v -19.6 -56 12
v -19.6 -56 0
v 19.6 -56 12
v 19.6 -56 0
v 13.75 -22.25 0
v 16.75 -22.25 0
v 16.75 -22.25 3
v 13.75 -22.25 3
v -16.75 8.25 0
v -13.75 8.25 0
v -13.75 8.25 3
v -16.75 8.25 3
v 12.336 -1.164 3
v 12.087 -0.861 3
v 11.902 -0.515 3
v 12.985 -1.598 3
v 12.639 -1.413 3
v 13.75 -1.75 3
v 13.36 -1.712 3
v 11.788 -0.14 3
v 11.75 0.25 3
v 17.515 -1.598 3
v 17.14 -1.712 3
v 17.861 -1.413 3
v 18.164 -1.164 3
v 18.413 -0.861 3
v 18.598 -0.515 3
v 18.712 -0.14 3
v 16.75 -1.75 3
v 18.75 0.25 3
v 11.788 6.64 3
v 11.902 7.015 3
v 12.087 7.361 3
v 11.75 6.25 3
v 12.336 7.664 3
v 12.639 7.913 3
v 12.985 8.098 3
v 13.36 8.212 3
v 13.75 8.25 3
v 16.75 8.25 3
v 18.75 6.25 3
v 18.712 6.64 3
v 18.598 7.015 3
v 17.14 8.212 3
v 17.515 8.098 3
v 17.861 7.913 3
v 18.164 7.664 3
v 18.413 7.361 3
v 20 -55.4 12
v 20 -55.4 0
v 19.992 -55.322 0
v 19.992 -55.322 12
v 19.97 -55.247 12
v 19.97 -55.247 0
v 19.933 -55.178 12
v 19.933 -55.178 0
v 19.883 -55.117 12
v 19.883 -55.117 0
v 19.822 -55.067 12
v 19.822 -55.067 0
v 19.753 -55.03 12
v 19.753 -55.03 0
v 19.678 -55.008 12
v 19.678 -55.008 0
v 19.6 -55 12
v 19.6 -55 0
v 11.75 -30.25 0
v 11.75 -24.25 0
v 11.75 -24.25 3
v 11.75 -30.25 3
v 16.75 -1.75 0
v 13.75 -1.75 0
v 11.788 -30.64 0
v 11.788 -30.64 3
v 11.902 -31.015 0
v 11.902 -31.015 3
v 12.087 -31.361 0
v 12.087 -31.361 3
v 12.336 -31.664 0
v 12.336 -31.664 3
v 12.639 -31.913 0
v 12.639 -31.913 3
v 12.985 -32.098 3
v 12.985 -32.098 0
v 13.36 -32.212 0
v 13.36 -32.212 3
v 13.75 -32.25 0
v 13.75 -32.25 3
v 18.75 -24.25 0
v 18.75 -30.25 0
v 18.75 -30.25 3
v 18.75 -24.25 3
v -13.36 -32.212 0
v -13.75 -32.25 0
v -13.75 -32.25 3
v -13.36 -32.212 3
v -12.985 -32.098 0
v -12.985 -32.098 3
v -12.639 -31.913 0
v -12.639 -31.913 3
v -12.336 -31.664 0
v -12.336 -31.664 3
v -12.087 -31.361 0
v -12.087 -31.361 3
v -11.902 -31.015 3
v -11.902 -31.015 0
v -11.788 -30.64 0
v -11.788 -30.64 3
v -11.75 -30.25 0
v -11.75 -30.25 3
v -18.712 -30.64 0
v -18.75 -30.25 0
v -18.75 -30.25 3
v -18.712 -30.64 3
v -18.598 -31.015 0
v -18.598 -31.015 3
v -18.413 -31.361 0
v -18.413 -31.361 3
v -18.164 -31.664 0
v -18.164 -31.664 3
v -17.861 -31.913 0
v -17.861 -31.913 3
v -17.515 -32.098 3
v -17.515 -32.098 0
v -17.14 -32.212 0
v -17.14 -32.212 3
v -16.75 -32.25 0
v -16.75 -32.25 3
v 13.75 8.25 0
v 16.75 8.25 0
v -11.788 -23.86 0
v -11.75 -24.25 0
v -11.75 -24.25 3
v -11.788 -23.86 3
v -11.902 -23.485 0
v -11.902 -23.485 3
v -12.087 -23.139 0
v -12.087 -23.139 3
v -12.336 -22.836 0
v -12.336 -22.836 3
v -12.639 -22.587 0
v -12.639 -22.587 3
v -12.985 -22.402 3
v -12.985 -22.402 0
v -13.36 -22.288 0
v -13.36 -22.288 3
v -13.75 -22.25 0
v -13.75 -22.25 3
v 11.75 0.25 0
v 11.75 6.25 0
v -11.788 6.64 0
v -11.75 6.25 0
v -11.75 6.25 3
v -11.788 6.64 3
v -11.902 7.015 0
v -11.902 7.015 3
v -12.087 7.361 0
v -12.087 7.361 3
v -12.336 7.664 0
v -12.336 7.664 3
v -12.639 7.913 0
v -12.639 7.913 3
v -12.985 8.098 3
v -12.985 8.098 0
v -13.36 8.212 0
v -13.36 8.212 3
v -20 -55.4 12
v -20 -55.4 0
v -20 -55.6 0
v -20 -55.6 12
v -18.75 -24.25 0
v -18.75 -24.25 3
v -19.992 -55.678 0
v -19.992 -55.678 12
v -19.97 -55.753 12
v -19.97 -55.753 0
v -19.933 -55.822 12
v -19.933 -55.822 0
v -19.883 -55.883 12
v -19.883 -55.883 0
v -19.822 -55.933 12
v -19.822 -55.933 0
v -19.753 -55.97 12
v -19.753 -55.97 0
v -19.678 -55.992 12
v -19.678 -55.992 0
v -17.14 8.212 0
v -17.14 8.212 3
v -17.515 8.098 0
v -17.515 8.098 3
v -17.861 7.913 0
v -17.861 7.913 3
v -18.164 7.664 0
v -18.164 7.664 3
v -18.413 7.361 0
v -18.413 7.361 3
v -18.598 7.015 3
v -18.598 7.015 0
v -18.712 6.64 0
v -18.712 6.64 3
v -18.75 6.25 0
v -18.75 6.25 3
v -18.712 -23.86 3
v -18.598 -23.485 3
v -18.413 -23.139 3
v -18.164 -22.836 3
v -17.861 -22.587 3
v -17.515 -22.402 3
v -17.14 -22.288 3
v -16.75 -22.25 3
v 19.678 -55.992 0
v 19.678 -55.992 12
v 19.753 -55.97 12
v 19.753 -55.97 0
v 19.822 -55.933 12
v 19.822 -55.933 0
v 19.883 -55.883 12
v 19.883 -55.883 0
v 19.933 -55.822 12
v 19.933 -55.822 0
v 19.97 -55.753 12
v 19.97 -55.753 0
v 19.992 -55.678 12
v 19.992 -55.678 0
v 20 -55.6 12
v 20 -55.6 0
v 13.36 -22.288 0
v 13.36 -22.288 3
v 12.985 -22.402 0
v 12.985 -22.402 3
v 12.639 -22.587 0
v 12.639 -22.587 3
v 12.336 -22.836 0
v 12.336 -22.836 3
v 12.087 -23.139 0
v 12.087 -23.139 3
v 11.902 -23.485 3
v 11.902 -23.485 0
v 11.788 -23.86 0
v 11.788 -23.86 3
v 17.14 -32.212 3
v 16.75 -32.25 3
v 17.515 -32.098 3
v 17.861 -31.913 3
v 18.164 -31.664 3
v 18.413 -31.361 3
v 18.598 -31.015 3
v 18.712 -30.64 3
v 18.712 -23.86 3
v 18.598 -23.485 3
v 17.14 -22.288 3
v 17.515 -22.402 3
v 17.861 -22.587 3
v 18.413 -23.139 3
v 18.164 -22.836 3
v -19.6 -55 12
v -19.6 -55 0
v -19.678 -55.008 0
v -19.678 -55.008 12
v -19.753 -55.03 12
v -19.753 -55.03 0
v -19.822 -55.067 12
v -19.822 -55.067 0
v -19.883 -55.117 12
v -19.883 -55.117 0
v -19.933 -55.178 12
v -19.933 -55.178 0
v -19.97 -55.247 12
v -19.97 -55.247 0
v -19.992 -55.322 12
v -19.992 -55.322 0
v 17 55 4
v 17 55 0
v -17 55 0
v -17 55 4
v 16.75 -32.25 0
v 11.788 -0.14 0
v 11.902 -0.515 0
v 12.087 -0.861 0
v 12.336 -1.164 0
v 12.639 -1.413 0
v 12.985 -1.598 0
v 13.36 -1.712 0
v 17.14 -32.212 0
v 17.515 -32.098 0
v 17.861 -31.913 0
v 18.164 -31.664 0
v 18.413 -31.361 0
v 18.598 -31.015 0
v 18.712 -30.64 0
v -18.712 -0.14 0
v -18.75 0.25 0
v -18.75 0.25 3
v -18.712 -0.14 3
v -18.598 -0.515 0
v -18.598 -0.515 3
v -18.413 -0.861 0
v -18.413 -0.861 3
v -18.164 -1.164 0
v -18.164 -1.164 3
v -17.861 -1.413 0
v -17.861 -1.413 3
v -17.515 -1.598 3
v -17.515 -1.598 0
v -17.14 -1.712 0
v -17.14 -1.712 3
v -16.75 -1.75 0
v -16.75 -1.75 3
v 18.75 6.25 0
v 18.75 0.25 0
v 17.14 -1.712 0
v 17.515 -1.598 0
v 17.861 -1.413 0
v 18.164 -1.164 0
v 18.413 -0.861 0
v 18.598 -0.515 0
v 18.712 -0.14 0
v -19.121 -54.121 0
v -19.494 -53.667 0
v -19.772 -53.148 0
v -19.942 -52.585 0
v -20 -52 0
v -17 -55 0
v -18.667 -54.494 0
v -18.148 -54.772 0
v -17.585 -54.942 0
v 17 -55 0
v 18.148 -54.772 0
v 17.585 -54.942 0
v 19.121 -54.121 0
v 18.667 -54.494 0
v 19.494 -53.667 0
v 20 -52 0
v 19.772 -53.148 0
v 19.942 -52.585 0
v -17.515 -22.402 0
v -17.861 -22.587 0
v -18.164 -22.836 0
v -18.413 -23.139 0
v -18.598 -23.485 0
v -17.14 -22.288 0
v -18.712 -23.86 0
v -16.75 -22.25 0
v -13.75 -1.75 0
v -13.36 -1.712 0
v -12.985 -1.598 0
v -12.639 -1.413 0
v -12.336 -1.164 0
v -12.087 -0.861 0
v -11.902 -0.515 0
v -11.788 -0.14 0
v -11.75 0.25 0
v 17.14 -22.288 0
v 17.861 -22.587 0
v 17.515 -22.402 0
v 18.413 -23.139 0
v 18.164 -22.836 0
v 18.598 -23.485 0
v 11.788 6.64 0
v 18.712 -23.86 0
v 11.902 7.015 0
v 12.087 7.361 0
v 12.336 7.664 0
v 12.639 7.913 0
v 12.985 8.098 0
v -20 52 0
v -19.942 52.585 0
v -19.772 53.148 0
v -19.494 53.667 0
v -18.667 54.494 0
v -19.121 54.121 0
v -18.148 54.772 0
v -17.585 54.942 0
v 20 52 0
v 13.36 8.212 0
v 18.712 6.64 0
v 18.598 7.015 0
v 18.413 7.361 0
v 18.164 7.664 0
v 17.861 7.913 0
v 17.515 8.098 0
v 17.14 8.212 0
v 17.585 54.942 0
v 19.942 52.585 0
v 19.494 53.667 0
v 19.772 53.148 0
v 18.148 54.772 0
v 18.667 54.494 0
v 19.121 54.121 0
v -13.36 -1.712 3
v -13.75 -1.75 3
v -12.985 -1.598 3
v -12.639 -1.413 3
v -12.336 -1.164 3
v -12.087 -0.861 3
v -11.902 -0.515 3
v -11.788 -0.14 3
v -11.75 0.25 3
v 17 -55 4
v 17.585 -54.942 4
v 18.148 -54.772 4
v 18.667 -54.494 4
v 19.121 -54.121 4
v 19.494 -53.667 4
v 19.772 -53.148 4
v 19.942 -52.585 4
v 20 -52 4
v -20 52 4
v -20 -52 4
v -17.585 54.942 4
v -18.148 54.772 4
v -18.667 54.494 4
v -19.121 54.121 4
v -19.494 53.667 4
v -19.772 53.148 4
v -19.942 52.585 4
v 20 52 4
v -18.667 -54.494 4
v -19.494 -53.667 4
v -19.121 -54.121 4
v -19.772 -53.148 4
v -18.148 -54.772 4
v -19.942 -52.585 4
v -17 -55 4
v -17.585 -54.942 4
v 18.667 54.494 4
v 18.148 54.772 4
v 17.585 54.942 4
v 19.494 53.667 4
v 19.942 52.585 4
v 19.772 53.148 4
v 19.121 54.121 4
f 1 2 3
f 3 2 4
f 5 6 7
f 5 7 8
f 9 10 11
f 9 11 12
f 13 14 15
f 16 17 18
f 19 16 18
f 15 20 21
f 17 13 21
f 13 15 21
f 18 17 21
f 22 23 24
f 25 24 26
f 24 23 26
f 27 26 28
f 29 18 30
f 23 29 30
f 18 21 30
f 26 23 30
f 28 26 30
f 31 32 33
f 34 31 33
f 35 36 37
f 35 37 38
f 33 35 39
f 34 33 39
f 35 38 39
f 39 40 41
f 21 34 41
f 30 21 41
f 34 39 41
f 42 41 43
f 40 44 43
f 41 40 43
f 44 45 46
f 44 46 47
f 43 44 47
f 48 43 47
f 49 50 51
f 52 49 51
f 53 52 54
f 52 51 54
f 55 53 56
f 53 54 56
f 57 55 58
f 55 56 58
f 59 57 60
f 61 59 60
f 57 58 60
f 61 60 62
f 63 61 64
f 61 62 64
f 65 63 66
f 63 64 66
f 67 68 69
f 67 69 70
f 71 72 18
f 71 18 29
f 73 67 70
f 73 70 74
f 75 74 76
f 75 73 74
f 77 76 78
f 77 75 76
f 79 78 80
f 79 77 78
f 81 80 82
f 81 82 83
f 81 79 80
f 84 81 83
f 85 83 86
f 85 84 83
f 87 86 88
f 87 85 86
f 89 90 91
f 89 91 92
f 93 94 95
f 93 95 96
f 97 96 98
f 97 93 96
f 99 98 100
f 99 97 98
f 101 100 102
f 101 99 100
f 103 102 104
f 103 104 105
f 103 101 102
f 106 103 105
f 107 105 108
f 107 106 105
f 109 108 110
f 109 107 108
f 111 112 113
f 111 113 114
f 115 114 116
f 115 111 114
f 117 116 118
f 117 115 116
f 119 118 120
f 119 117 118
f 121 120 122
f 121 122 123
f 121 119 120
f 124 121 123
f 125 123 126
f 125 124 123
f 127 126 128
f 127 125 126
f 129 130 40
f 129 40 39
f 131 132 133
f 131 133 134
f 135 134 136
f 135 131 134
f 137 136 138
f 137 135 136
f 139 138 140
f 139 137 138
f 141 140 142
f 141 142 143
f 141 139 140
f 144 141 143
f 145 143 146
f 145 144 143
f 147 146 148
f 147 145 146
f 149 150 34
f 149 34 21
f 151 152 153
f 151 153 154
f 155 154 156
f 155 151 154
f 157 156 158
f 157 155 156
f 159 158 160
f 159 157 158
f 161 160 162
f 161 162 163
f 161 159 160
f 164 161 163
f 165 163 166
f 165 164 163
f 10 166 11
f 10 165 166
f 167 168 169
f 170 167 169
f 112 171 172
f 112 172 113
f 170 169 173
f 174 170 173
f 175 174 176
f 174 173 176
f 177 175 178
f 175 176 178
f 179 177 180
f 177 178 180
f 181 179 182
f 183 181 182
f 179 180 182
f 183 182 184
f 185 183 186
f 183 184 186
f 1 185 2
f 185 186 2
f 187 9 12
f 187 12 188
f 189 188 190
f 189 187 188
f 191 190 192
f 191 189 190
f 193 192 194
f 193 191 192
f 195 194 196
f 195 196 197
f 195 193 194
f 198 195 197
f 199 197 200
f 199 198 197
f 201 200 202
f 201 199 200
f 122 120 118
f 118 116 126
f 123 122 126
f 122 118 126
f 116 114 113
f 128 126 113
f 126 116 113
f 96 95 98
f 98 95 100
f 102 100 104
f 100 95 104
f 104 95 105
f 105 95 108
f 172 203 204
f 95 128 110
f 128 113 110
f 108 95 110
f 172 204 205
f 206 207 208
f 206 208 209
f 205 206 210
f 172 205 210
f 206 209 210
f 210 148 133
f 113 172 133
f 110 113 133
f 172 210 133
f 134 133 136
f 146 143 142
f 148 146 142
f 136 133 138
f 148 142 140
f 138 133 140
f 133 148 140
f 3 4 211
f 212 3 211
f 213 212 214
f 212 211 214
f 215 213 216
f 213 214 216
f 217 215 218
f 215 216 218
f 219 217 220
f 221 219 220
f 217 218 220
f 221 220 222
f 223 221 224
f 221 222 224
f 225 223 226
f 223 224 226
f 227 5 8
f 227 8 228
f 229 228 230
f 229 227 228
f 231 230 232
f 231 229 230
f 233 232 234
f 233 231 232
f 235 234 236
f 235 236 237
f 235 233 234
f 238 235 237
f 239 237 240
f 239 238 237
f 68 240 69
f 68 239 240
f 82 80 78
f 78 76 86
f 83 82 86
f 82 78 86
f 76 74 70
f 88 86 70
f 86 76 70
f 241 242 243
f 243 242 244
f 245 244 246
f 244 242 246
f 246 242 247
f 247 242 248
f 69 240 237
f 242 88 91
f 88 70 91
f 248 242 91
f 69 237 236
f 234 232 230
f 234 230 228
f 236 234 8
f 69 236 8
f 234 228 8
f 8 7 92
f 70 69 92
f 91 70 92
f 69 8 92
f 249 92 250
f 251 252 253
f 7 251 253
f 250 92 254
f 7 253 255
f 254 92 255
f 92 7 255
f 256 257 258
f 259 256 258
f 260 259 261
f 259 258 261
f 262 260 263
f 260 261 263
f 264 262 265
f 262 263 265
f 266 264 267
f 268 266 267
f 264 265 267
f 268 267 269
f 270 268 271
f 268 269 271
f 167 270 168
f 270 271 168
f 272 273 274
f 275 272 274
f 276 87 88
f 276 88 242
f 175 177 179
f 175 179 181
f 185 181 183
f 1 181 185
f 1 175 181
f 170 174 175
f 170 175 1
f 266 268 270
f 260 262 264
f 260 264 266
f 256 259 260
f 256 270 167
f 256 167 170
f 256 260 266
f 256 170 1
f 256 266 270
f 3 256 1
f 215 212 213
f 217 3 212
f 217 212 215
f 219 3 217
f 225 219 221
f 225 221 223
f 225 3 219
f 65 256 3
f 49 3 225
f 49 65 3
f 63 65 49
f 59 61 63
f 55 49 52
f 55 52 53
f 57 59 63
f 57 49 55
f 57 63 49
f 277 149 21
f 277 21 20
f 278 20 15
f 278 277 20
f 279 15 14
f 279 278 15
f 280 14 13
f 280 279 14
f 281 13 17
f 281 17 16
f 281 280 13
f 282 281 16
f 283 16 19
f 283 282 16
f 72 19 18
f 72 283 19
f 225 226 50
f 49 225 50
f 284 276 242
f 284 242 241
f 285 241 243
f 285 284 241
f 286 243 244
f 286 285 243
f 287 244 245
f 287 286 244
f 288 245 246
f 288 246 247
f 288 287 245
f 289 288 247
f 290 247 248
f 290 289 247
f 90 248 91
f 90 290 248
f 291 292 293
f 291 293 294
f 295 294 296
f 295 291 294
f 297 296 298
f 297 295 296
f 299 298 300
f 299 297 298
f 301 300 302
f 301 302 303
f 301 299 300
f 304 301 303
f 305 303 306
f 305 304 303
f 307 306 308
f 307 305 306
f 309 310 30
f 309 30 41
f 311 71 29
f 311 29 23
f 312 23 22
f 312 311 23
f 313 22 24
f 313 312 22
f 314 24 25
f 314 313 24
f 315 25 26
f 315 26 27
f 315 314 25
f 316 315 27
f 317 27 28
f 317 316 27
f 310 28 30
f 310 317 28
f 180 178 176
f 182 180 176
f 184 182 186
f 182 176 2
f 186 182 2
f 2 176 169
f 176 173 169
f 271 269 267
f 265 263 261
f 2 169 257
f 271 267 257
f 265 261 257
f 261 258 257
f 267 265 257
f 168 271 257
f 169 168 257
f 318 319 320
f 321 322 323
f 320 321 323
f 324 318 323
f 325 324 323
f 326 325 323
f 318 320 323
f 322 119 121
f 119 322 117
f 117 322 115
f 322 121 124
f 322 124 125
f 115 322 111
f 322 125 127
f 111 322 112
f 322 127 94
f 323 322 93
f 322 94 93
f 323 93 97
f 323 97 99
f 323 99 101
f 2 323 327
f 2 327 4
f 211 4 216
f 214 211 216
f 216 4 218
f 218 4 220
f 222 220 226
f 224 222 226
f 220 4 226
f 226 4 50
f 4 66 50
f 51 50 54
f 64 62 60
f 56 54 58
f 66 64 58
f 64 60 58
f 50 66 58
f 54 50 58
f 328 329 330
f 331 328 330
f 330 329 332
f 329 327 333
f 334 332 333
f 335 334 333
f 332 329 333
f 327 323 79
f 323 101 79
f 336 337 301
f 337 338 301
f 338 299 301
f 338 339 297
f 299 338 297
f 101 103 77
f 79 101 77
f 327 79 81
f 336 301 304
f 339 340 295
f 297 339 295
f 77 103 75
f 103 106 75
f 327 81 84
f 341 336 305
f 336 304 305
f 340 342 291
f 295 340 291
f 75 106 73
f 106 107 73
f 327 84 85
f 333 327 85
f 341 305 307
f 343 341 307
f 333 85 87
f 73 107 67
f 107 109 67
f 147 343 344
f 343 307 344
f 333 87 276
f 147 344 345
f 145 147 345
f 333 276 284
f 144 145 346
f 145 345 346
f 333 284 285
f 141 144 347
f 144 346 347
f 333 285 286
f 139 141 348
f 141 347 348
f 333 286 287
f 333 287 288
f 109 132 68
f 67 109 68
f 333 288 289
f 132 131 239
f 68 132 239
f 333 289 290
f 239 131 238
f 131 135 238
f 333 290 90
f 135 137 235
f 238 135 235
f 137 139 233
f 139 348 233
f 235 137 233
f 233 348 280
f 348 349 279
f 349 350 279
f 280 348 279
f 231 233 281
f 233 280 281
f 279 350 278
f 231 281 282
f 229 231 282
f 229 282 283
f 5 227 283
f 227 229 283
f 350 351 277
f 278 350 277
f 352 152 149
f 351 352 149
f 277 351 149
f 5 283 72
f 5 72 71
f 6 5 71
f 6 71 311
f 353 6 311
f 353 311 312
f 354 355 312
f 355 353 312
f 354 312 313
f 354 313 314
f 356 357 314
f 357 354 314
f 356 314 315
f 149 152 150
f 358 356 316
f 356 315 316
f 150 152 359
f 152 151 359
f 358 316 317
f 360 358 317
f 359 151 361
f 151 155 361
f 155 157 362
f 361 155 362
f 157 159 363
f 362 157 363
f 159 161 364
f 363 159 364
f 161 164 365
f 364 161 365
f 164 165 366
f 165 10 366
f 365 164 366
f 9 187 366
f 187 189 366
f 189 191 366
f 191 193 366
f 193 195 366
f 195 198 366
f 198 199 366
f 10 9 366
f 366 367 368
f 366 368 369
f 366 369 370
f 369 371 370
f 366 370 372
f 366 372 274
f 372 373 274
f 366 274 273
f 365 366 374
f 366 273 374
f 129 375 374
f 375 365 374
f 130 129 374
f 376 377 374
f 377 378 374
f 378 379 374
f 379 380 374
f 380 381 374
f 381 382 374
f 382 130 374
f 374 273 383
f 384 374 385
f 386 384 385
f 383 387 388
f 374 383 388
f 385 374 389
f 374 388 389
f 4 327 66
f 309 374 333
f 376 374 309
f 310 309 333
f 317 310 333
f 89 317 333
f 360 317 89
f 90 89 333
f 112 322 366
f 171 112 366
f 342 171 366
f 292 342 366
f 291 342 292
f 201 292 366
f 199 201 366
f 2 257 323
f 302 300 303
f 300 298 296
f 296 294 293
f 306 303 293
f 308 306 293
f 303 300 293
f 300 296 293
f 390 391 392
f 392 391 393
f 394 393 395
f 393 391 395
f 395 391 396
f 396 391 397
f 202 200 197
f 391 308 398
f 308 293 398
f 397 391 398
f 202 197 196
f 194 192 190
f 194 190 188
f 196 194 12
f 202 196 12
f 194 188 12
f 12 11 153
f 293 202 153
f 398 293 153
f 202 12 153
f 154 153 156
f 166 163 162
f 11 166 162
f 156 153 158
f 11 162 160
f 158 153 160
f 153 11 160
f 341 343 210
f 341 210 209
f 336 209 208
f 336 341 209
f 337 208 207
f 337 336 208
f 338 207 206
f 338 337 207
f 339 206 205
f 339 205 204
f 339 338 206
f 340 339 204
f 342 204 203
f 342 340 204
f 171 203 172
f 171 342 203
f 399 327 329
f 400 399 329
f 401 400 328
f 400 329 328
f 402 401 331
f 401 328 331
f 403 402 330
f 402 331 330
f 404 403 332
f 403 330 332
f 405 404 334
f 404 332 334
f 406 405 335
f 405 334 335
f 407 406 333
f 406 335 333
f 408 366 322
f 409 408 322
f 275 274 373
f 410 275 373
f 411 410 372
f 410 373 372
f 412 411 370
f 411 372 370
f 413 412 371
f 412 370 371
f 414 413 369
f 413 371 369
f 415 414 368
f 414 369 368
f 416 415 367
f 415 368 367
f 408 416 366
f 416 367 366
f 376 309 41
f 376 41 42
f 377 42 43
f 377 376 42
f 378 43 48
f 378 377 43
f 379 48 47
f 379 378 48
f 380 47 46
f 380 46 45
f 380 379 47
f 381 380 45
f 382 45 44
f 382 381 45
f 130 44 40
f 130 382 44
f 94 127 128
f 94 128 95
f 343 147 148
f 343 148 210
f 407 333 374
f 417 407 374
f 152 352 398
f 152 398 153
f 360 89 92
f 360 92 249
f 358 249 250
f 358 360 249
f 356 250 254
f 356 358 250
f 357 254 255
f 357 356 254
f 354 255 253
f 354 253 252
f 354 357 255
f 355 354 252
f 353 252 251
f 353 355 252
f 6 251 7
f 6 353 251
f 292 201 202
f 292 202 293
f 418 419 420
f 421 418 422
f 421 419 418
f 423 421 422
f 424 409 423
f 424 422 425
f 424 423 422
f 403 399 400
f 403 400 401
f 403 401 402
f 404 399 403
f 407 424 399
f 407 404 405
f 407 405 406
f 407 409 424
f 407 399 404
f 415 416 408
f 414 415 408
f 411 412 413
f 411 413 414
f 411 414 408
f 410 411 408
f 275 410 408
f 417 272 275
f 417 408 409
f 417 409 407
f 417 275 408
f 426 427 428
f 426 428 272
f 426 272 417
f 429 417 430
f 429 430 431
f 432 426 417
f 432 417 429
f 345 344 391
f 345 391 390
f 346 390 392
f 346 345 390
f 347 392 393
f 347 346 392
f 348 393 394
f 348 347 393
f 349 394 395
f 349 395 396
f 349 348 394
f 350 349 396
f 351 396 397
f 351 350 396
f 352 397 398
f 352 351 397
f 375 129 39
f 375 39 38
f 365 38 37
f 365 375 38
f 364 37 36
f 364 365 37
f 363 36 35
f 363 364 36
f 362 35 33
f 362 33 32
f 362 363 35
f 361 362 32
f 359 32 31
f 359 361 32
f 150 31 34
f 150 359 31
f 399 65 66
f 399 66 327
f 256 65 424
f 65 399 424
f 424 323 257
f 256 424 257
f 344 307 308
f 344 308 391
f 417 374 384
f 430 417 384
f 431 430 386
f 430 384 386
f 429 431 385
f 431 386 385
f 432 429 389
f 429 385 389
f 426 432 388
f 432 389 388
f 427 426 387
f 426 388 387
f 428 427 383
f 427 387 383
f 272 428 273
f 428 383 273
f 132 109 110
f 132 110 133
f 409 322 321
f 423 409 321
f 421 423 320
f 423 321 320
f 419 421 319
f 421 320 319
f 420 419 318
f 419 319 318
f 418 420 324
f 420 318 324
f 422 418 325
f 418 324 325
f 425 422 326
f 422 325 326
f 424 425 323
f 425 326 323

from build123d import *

# Parameters (mm, degrees)
EXTRUDE_233_DEPTH     = 4
CUT_EXTRUDE_382_DEPTH = 3
EXTRUDE_469_DEPTH     = 12


with BuildPart() as part:
    # 草图3 → Extrude 233 (new body)
    with BuildSketch(Plane.XY):
        with BuildLine():
            Line((-17, -55), (17, -55))
            ThreePointArc((17, -55), (19.121320344, -54.121320344), (20, -52))
            Line((20, -52), (20, 52))
            ThreePointArc((20, 52), (19.121320344, 54.121320344), (17, 55))
            Line((17, 55), (-17, 55))
            ThreePointArc((-17, 55), (-19.121320344, 54.121320344), (-20, 52))
            Line((-20, 52), (-20, -52))
            ThreePointArc((-20, -52), (-19.121320344, -54.121320344), (-17, -55))
        make_face()
    extrude(amount=EXTRUDE_233_DEPTH)

    # 草图4 → Cut-Extrude 382 (cut)
    with BuildSketch(Plane.XY):
        with BuildLine():
            Line((-16.75, -32.25), (-13.75, -32.25))
            ThreePointArc((-13.75, -32.25), (-12.335786438, -31.664213562), (-11.75, -30.25))
            Line((-11.75, -30.25), (-11.75, -24.25))
            ThreePointArc((-11.75, -24.25), (-12.335786438, -22.835786438), (-13.75, -22.25))
            Line((-13.75, -22.25), (-16.75, -22.25))
            ThreePointArc((-16.75, -22.25), (-18.164213562, -22.835786438), (-18.75, -24.25))
            Line((-18.75, -24.25), (-18.75, -30.25))
            ThreePointArc((-18.75, -30.25), (-18.164213562, -31.664213562), (-16.75, -32.25))
        make_face()
        with BuildLine():
            Line((-16.75, -1.75), (-13.75, -1.75))
            ThreePointArc((-13.75, -1.75), (-12.335786438, -1.164213562), (-11.75, 0.25))
            Line((-11.75, 0.25), (-11.75, 6.25))
            ThreePointArc((-11.75, 6.25), (-12.335786438, 7.664213562), (-13.75, 8.25))
            Line((-13.75, 8.25), (-16.75, 8.25))
            ThreePointArc((-16.75, 8.25), (-18.164213562, 7.664213562), (-18.75, 6.25))
            Line((-18.75, 6.25), (-18.75, 0.25))
            ThreePointArc((-18.75, 0.25), (-18.164213562, -1.164213562), (-16.75, -1.75))
        make_face()
        with BuildLine():
            Line((13.75, -32.25), (16.75, -32.25))
            ThreePointArc((16.75, -32.25), (18.164213562, -31.664213562), (18.75, -30.25))
            Line((18.75, -30.25), (18.75, -24.25))
            ThreePointArc((18.75, -24.25), (18.164213562, -22.835786438), (16.75, -22.25))
            Line((16.75, -22.25), (13.75, -22.25))
            ThreePointArc((13.75, -22.25), (12.335786438, -22.835786438), (11.75, -24.25))
            Line((11.75, -24.25), (11.75, -30.25))
            ThreePointArc((11.75, -30.25), (12.335786438, -31.664213562), (13.75, -32.25))
        make_face()
        with BuildLine():
            Line((13.75, -1.75), (16.75, -1.75))
            ThreePointArc((16.75, -1.75), (18.164213562, -1.164213562), (18.75, 0.25))
            Line((18.75, 0.25), (18.75, 6.25))
            ThreePointArc((18.75, 6.25), (18.164213562, 7.664213562), (16.75, 8.25))
            Line((16.75, 8.25), (13.75, 8.25))
            ThreePointArc((13.75, 8.25), (12.335786438, 7.664213562), (11.75, 6.25))
            Line((11.75, 6.25), (11.75, 0.25))
            ThreePointArc((11.75, 0.25), (12.335786438, -1.164213562), (13.75, -1.75))
        make_face()
    extrude(amount=CUT_EXTRUDE_382_DEPTH, mode=Mode.SUBTRACT)

    # 草图5 → Extrude 469 (add)
    with BuildSketch(Plane.XY):
        with BuildLine():
            Line((-19.6, -56), (19.6, -56))
            ThreePointArc((19.6, -56), (19.882842712, -55.882842712), (20, -55.6))
            Line((20, -55.6), (20, -55.4))
            ThreePointArc((20, -55.4), (19.882842712, -55.117157288), (19.6, -55))
            Line((19.6, -55), (-19.6, -55))
            ThreePointArc((-19.6, -55), (-19.882842712, -55.117157288), (-20, -55.4))
            Line((-20, -55.4), (-20, -55.6))
            ThreePointArc((-20, -55.6), (-19.882842712, -55.882842712), (-19.6, -56))
        make_face()
    extrude(amount=EXTRUDE_469_DEPTH)


solid = part.part
